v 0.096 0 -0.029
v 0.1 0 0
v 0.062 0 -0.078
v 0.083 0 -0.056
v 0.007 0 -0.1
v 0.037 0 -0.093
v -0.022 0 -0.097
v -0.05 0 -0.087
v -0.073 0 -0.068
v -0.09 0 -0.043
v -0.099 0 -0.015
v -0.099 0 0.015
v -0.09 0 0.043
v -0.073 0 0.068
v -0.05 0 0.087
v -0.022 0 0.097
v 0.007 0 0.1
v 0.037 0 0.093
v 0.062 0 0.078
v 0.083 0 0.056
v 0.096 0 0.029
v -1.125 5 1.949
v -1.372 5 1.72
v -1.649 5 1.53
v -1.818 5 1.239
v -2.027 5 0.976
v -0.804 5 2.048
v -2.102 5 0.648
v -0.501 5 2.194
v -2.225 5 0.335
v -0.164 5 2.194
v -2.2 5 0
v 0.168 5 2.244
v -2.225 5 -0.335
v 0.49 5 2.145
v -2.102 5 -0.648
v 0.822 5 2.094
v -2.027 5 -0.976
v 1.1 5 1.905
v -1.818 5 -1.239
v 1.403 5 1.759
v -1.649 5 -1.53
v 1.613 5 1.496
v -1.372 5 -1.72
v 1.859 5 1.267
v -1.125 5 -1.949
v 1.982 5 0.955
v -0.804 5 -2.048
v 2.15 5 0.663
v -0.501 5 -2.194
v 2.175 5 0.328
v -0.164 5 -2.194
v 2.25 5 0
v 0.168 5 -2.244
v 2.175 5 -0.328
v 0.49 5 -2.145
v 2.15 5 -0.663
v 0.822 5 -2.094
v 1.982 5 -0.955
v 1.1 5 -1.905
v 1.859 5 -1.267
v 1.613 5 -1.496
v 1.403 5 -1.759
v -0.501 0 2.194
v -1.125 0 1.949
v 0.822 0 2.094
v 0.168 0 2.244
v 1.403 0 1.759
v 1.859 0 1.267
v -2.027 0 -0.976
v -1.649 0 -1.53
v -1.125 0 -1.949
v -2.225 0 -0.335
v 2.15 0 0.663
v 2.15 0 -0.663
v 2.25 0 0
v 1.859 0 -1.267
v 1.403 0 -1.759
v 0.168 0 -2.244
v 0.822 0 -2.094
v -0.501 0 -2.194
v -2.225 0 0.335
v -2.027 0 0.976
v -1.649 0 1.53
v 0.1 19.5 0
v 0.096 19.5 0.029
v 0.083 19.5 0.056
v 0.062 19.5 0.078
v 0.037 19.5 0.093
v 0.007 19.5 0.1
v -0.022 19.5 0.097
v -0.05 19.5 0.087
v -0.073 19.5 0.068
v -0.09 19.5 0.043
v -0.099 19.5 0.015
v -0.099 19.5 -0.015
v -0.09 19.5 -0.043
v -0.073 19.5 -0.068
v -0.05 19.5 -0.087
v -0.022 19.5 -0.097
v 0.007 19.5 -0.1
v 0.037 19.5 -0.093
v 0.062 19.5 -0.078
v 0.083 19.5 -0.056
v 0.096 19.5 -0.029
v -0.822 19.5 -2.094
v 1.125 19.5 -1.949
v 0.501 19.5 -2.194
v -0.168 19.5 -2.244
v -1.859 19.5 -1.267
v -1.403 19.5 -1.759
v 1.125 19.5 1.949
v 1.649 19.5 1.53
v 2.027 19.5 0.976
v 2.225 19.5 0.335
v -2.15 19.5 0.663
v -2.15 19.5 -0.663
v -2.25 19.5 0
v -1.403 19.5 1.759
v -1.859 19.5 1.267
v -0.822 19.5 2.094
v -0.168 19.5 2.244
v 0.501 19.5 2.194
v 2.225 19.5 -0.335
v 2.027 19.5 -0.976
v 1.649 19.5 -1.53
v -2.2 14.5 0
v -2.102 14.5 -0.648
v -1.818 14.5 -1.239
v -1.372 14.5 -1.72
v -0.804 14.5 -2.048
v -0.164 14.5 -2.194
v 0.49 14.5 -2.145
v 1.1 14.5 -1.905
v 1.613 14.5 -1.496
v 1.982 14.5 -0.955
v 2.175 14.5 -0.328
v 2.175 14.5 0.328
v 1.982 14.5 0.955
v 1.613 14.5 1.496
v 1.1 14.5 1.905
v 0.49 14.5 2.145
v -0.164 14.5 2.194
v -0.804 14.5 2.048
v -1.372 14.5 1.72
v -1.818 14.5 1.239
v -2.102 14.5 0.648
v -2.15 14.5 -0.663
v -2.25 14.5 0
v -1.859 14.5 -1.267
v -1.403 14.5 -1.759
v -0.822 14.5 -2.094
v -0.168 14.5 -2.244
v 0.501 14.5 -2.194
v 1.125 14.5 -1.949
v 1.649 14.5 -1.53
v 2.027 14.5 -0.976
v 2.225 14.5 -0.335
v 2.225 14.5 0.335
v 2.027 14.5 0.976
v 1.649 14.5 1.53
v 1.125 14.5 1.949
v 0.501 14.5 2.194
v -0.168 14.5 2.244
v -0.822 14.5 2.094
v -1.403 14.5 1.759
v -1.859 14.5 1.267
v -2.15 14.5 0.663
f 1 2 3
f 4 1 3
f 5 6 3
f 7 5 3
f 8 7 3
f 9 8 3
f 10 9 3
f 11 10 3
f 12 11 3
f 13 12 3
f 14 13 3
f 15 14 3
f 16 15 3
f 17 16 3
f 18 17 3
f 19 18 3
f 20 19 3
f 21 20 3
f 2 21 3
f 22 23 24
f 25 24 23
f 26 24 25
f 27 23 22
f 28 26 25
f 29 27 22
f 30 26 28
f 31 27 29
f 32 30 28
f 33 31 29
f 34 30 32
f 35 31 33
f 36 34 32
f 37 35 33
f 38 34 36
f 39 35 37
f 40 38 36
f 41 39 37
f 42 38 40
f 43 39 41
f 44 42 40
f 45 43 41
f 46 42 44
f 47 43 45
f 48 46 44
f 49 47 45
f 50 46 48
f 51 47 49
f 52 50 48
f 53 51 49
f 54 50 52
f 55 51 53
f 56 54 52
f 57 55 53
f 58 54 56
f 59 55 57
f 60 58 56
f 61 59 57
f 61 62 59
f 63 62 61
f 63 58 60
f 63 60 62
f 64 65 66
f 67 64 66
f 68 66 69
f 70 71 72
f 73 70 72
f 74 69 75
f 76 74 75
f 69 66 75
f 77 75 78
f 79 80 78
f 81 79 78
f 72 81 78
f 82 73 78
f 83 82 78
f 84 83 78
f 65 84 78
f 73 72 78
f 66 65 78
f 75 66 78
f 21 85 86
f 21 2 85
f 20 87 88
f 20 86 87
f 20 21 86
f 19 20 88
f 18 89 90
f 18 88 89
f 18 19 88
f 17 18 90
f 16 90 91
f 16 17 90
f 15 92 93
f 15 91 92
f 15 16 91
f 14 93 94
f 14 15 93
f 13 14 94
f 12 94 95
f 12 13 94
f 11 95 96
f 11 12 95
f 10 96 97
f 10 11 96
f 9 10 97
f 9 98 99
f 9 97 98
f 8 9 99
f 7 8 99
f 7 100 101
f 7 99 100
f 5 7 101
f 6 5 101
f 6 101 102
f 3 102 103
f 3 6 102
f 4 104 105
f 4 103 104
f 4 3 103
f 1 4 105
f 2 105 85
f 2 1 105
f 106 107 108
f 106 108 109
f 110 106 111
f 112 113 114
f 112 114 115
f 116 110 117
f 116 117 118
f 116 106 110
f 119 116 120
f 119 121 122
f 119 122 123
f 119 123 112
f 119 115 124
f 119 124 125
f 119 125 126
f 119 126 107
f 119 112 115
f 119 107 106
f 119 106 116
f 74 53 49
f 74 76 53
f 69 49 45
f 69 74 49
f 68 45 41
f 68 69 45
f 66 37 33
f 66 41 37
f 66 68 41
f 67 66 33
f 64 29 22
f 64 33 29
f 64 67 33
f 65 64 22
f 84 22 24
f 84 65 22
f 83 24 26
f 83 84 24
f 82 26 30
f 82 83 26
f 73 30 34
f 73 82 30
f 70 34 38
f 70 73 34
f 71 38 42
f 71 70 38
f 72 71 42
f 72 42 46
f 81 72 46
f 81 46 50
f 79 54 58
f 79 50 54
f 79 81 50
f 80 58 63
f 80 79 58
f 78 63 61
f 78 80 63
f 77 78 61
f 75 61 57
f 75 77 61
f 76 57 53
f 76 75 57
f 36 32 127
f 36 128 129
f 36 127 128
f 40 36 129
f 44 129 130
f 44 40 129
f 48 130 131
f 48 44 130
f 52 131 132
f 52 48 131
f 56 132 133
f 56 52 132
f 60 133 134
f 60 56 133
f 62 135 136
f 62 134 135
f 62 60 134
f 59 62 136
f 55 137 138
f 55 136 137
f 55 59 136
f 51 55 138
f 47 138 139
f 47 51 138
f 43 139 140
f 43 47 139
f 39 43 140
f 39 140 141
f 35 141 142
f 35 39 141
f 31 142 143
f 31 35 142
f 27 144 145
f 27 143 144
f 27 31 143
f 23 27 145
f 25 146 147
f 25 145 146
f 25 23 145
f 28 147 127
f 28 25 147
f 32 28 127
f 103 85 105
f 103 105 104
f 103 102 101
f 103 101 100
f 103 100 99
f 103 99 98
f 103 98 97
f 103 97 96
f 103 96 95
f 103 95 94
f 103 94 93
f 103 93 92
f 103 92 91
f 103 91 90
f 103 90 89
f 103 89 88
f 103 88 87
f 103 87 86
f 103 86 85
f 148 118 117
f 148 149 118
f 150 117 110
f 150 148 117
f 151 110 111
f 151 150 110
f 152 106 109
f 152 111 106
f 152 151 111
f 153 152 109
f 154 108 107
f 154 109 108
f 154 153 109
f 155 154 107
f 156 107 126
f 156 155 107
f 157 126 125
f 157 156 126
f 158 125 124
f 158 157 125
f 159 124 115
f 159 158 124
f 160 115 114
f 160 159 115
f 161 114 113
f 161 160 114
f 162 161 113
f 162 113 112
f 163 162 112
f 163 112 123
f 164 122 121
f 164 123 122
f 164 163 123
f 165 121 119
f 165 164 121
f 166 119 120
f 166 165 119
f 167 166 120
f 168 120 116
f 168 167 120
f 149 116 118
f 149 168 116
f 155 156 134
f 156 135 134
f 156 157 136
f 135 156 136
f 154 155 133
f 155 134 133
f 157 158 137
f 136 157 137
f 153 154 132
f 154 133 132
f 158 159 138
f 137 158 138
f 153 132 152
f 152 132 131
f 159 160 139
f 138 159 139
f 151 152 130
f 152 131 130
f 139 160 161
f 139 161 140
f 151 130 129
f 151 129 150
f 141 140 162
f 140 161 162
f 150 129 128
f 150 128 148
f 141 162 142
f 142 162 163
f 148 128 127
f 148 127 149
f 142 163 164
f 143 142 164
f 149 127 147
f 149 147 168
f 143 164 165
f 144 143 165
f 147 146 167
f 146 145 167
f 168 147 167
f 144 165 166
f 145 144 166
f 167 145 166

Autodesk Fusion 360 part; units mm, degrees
sketch "Sketch1" plane through (0, 0, 0) normal (0, 1, 0) x (1, 0, 0)
  circle A0 centre (0, 0) radius 2.25
  dimension "d1" = 4.5
extrude "Extrude1" add sketch "Sketch1" along normal blind 5 makes body 1
sketch "Sketch2" plane through (0, 5, 0) normal (0, 1, 0) x (-1, 0, 0)
  circle A0 centre (0, 0) radius 2.25
  circle A1 centre (0, 0) radius 2.2
  dimension "d4" = 4.4
extrude "Extrude2" add sketch "Sketch2" along normal blind 9.5 contours A1 bodies 1
sketch "Sketch3" plane through (0, 14.5, 0) normal (0, 1, 0) x (-1, 0, 0)
  circle A0 centre (0, 0) radius 2.2
  circle A1 centre (0, 0) radius 2.25
  dimension "d7" = 4.5
extrude "Extrude3" add sketch "Sketch3" along normal blind 5 separate body makes body 2
extrude "Extrude4" add 1 faces at (-0.5815, 14.5, -0.3062) along direction (0, 1, 0) blind 5 on bodies 1 bodies 1 2
sketch "Sketch4" plane through (0, 0, 0) normal (0, 1, 0) x (1, 0, 0)
  circle A0 centre (0, 0) radius 0.1
  dimension "d12" = 0.2
extrude "Extrude5" add sketch "Sketch4" along normal blind 19.5 bodies 1
sketch "Sketch5" plane through (0, 0, 0) normal (0, 1, 0) x (1, 0, 0)
  circle A0 centre (0, 0) radius 0.1
  dimension "d15" = 0.2
extrude "Extrude6" add sketch "Sketch5" along normal blind 19.5 bodies 1
sketch "Sketch6" plane through (0, 0, 0) normal (0, -1, 0) x (1, 0, 0)
  circle A0 centre (0, 0) radius 2.25
  circle A1 centre (0, 0) radius 0.25
  dimension "d18" = 0.5
extrude "Extrude7" add sketch "Sketch6" against normal blind 19.5 contours A1 bodies 1
sketch "Sketch7" plane through (0, 0, 0) normal (0, 1, 0) x (1, 0, 0)
  circle A0 centre (0, 0) radius 0.1
  dimension "d23" = 0.2
extrude "Extrude1'" add sketch "Sketch7" along normal blind 19.5 separate body makes body 3 in component "Component"
component "Component" placed x (1, 0, 0) y (0, 1, 0) z (0, 0, 1) at (0, 0, 0)
